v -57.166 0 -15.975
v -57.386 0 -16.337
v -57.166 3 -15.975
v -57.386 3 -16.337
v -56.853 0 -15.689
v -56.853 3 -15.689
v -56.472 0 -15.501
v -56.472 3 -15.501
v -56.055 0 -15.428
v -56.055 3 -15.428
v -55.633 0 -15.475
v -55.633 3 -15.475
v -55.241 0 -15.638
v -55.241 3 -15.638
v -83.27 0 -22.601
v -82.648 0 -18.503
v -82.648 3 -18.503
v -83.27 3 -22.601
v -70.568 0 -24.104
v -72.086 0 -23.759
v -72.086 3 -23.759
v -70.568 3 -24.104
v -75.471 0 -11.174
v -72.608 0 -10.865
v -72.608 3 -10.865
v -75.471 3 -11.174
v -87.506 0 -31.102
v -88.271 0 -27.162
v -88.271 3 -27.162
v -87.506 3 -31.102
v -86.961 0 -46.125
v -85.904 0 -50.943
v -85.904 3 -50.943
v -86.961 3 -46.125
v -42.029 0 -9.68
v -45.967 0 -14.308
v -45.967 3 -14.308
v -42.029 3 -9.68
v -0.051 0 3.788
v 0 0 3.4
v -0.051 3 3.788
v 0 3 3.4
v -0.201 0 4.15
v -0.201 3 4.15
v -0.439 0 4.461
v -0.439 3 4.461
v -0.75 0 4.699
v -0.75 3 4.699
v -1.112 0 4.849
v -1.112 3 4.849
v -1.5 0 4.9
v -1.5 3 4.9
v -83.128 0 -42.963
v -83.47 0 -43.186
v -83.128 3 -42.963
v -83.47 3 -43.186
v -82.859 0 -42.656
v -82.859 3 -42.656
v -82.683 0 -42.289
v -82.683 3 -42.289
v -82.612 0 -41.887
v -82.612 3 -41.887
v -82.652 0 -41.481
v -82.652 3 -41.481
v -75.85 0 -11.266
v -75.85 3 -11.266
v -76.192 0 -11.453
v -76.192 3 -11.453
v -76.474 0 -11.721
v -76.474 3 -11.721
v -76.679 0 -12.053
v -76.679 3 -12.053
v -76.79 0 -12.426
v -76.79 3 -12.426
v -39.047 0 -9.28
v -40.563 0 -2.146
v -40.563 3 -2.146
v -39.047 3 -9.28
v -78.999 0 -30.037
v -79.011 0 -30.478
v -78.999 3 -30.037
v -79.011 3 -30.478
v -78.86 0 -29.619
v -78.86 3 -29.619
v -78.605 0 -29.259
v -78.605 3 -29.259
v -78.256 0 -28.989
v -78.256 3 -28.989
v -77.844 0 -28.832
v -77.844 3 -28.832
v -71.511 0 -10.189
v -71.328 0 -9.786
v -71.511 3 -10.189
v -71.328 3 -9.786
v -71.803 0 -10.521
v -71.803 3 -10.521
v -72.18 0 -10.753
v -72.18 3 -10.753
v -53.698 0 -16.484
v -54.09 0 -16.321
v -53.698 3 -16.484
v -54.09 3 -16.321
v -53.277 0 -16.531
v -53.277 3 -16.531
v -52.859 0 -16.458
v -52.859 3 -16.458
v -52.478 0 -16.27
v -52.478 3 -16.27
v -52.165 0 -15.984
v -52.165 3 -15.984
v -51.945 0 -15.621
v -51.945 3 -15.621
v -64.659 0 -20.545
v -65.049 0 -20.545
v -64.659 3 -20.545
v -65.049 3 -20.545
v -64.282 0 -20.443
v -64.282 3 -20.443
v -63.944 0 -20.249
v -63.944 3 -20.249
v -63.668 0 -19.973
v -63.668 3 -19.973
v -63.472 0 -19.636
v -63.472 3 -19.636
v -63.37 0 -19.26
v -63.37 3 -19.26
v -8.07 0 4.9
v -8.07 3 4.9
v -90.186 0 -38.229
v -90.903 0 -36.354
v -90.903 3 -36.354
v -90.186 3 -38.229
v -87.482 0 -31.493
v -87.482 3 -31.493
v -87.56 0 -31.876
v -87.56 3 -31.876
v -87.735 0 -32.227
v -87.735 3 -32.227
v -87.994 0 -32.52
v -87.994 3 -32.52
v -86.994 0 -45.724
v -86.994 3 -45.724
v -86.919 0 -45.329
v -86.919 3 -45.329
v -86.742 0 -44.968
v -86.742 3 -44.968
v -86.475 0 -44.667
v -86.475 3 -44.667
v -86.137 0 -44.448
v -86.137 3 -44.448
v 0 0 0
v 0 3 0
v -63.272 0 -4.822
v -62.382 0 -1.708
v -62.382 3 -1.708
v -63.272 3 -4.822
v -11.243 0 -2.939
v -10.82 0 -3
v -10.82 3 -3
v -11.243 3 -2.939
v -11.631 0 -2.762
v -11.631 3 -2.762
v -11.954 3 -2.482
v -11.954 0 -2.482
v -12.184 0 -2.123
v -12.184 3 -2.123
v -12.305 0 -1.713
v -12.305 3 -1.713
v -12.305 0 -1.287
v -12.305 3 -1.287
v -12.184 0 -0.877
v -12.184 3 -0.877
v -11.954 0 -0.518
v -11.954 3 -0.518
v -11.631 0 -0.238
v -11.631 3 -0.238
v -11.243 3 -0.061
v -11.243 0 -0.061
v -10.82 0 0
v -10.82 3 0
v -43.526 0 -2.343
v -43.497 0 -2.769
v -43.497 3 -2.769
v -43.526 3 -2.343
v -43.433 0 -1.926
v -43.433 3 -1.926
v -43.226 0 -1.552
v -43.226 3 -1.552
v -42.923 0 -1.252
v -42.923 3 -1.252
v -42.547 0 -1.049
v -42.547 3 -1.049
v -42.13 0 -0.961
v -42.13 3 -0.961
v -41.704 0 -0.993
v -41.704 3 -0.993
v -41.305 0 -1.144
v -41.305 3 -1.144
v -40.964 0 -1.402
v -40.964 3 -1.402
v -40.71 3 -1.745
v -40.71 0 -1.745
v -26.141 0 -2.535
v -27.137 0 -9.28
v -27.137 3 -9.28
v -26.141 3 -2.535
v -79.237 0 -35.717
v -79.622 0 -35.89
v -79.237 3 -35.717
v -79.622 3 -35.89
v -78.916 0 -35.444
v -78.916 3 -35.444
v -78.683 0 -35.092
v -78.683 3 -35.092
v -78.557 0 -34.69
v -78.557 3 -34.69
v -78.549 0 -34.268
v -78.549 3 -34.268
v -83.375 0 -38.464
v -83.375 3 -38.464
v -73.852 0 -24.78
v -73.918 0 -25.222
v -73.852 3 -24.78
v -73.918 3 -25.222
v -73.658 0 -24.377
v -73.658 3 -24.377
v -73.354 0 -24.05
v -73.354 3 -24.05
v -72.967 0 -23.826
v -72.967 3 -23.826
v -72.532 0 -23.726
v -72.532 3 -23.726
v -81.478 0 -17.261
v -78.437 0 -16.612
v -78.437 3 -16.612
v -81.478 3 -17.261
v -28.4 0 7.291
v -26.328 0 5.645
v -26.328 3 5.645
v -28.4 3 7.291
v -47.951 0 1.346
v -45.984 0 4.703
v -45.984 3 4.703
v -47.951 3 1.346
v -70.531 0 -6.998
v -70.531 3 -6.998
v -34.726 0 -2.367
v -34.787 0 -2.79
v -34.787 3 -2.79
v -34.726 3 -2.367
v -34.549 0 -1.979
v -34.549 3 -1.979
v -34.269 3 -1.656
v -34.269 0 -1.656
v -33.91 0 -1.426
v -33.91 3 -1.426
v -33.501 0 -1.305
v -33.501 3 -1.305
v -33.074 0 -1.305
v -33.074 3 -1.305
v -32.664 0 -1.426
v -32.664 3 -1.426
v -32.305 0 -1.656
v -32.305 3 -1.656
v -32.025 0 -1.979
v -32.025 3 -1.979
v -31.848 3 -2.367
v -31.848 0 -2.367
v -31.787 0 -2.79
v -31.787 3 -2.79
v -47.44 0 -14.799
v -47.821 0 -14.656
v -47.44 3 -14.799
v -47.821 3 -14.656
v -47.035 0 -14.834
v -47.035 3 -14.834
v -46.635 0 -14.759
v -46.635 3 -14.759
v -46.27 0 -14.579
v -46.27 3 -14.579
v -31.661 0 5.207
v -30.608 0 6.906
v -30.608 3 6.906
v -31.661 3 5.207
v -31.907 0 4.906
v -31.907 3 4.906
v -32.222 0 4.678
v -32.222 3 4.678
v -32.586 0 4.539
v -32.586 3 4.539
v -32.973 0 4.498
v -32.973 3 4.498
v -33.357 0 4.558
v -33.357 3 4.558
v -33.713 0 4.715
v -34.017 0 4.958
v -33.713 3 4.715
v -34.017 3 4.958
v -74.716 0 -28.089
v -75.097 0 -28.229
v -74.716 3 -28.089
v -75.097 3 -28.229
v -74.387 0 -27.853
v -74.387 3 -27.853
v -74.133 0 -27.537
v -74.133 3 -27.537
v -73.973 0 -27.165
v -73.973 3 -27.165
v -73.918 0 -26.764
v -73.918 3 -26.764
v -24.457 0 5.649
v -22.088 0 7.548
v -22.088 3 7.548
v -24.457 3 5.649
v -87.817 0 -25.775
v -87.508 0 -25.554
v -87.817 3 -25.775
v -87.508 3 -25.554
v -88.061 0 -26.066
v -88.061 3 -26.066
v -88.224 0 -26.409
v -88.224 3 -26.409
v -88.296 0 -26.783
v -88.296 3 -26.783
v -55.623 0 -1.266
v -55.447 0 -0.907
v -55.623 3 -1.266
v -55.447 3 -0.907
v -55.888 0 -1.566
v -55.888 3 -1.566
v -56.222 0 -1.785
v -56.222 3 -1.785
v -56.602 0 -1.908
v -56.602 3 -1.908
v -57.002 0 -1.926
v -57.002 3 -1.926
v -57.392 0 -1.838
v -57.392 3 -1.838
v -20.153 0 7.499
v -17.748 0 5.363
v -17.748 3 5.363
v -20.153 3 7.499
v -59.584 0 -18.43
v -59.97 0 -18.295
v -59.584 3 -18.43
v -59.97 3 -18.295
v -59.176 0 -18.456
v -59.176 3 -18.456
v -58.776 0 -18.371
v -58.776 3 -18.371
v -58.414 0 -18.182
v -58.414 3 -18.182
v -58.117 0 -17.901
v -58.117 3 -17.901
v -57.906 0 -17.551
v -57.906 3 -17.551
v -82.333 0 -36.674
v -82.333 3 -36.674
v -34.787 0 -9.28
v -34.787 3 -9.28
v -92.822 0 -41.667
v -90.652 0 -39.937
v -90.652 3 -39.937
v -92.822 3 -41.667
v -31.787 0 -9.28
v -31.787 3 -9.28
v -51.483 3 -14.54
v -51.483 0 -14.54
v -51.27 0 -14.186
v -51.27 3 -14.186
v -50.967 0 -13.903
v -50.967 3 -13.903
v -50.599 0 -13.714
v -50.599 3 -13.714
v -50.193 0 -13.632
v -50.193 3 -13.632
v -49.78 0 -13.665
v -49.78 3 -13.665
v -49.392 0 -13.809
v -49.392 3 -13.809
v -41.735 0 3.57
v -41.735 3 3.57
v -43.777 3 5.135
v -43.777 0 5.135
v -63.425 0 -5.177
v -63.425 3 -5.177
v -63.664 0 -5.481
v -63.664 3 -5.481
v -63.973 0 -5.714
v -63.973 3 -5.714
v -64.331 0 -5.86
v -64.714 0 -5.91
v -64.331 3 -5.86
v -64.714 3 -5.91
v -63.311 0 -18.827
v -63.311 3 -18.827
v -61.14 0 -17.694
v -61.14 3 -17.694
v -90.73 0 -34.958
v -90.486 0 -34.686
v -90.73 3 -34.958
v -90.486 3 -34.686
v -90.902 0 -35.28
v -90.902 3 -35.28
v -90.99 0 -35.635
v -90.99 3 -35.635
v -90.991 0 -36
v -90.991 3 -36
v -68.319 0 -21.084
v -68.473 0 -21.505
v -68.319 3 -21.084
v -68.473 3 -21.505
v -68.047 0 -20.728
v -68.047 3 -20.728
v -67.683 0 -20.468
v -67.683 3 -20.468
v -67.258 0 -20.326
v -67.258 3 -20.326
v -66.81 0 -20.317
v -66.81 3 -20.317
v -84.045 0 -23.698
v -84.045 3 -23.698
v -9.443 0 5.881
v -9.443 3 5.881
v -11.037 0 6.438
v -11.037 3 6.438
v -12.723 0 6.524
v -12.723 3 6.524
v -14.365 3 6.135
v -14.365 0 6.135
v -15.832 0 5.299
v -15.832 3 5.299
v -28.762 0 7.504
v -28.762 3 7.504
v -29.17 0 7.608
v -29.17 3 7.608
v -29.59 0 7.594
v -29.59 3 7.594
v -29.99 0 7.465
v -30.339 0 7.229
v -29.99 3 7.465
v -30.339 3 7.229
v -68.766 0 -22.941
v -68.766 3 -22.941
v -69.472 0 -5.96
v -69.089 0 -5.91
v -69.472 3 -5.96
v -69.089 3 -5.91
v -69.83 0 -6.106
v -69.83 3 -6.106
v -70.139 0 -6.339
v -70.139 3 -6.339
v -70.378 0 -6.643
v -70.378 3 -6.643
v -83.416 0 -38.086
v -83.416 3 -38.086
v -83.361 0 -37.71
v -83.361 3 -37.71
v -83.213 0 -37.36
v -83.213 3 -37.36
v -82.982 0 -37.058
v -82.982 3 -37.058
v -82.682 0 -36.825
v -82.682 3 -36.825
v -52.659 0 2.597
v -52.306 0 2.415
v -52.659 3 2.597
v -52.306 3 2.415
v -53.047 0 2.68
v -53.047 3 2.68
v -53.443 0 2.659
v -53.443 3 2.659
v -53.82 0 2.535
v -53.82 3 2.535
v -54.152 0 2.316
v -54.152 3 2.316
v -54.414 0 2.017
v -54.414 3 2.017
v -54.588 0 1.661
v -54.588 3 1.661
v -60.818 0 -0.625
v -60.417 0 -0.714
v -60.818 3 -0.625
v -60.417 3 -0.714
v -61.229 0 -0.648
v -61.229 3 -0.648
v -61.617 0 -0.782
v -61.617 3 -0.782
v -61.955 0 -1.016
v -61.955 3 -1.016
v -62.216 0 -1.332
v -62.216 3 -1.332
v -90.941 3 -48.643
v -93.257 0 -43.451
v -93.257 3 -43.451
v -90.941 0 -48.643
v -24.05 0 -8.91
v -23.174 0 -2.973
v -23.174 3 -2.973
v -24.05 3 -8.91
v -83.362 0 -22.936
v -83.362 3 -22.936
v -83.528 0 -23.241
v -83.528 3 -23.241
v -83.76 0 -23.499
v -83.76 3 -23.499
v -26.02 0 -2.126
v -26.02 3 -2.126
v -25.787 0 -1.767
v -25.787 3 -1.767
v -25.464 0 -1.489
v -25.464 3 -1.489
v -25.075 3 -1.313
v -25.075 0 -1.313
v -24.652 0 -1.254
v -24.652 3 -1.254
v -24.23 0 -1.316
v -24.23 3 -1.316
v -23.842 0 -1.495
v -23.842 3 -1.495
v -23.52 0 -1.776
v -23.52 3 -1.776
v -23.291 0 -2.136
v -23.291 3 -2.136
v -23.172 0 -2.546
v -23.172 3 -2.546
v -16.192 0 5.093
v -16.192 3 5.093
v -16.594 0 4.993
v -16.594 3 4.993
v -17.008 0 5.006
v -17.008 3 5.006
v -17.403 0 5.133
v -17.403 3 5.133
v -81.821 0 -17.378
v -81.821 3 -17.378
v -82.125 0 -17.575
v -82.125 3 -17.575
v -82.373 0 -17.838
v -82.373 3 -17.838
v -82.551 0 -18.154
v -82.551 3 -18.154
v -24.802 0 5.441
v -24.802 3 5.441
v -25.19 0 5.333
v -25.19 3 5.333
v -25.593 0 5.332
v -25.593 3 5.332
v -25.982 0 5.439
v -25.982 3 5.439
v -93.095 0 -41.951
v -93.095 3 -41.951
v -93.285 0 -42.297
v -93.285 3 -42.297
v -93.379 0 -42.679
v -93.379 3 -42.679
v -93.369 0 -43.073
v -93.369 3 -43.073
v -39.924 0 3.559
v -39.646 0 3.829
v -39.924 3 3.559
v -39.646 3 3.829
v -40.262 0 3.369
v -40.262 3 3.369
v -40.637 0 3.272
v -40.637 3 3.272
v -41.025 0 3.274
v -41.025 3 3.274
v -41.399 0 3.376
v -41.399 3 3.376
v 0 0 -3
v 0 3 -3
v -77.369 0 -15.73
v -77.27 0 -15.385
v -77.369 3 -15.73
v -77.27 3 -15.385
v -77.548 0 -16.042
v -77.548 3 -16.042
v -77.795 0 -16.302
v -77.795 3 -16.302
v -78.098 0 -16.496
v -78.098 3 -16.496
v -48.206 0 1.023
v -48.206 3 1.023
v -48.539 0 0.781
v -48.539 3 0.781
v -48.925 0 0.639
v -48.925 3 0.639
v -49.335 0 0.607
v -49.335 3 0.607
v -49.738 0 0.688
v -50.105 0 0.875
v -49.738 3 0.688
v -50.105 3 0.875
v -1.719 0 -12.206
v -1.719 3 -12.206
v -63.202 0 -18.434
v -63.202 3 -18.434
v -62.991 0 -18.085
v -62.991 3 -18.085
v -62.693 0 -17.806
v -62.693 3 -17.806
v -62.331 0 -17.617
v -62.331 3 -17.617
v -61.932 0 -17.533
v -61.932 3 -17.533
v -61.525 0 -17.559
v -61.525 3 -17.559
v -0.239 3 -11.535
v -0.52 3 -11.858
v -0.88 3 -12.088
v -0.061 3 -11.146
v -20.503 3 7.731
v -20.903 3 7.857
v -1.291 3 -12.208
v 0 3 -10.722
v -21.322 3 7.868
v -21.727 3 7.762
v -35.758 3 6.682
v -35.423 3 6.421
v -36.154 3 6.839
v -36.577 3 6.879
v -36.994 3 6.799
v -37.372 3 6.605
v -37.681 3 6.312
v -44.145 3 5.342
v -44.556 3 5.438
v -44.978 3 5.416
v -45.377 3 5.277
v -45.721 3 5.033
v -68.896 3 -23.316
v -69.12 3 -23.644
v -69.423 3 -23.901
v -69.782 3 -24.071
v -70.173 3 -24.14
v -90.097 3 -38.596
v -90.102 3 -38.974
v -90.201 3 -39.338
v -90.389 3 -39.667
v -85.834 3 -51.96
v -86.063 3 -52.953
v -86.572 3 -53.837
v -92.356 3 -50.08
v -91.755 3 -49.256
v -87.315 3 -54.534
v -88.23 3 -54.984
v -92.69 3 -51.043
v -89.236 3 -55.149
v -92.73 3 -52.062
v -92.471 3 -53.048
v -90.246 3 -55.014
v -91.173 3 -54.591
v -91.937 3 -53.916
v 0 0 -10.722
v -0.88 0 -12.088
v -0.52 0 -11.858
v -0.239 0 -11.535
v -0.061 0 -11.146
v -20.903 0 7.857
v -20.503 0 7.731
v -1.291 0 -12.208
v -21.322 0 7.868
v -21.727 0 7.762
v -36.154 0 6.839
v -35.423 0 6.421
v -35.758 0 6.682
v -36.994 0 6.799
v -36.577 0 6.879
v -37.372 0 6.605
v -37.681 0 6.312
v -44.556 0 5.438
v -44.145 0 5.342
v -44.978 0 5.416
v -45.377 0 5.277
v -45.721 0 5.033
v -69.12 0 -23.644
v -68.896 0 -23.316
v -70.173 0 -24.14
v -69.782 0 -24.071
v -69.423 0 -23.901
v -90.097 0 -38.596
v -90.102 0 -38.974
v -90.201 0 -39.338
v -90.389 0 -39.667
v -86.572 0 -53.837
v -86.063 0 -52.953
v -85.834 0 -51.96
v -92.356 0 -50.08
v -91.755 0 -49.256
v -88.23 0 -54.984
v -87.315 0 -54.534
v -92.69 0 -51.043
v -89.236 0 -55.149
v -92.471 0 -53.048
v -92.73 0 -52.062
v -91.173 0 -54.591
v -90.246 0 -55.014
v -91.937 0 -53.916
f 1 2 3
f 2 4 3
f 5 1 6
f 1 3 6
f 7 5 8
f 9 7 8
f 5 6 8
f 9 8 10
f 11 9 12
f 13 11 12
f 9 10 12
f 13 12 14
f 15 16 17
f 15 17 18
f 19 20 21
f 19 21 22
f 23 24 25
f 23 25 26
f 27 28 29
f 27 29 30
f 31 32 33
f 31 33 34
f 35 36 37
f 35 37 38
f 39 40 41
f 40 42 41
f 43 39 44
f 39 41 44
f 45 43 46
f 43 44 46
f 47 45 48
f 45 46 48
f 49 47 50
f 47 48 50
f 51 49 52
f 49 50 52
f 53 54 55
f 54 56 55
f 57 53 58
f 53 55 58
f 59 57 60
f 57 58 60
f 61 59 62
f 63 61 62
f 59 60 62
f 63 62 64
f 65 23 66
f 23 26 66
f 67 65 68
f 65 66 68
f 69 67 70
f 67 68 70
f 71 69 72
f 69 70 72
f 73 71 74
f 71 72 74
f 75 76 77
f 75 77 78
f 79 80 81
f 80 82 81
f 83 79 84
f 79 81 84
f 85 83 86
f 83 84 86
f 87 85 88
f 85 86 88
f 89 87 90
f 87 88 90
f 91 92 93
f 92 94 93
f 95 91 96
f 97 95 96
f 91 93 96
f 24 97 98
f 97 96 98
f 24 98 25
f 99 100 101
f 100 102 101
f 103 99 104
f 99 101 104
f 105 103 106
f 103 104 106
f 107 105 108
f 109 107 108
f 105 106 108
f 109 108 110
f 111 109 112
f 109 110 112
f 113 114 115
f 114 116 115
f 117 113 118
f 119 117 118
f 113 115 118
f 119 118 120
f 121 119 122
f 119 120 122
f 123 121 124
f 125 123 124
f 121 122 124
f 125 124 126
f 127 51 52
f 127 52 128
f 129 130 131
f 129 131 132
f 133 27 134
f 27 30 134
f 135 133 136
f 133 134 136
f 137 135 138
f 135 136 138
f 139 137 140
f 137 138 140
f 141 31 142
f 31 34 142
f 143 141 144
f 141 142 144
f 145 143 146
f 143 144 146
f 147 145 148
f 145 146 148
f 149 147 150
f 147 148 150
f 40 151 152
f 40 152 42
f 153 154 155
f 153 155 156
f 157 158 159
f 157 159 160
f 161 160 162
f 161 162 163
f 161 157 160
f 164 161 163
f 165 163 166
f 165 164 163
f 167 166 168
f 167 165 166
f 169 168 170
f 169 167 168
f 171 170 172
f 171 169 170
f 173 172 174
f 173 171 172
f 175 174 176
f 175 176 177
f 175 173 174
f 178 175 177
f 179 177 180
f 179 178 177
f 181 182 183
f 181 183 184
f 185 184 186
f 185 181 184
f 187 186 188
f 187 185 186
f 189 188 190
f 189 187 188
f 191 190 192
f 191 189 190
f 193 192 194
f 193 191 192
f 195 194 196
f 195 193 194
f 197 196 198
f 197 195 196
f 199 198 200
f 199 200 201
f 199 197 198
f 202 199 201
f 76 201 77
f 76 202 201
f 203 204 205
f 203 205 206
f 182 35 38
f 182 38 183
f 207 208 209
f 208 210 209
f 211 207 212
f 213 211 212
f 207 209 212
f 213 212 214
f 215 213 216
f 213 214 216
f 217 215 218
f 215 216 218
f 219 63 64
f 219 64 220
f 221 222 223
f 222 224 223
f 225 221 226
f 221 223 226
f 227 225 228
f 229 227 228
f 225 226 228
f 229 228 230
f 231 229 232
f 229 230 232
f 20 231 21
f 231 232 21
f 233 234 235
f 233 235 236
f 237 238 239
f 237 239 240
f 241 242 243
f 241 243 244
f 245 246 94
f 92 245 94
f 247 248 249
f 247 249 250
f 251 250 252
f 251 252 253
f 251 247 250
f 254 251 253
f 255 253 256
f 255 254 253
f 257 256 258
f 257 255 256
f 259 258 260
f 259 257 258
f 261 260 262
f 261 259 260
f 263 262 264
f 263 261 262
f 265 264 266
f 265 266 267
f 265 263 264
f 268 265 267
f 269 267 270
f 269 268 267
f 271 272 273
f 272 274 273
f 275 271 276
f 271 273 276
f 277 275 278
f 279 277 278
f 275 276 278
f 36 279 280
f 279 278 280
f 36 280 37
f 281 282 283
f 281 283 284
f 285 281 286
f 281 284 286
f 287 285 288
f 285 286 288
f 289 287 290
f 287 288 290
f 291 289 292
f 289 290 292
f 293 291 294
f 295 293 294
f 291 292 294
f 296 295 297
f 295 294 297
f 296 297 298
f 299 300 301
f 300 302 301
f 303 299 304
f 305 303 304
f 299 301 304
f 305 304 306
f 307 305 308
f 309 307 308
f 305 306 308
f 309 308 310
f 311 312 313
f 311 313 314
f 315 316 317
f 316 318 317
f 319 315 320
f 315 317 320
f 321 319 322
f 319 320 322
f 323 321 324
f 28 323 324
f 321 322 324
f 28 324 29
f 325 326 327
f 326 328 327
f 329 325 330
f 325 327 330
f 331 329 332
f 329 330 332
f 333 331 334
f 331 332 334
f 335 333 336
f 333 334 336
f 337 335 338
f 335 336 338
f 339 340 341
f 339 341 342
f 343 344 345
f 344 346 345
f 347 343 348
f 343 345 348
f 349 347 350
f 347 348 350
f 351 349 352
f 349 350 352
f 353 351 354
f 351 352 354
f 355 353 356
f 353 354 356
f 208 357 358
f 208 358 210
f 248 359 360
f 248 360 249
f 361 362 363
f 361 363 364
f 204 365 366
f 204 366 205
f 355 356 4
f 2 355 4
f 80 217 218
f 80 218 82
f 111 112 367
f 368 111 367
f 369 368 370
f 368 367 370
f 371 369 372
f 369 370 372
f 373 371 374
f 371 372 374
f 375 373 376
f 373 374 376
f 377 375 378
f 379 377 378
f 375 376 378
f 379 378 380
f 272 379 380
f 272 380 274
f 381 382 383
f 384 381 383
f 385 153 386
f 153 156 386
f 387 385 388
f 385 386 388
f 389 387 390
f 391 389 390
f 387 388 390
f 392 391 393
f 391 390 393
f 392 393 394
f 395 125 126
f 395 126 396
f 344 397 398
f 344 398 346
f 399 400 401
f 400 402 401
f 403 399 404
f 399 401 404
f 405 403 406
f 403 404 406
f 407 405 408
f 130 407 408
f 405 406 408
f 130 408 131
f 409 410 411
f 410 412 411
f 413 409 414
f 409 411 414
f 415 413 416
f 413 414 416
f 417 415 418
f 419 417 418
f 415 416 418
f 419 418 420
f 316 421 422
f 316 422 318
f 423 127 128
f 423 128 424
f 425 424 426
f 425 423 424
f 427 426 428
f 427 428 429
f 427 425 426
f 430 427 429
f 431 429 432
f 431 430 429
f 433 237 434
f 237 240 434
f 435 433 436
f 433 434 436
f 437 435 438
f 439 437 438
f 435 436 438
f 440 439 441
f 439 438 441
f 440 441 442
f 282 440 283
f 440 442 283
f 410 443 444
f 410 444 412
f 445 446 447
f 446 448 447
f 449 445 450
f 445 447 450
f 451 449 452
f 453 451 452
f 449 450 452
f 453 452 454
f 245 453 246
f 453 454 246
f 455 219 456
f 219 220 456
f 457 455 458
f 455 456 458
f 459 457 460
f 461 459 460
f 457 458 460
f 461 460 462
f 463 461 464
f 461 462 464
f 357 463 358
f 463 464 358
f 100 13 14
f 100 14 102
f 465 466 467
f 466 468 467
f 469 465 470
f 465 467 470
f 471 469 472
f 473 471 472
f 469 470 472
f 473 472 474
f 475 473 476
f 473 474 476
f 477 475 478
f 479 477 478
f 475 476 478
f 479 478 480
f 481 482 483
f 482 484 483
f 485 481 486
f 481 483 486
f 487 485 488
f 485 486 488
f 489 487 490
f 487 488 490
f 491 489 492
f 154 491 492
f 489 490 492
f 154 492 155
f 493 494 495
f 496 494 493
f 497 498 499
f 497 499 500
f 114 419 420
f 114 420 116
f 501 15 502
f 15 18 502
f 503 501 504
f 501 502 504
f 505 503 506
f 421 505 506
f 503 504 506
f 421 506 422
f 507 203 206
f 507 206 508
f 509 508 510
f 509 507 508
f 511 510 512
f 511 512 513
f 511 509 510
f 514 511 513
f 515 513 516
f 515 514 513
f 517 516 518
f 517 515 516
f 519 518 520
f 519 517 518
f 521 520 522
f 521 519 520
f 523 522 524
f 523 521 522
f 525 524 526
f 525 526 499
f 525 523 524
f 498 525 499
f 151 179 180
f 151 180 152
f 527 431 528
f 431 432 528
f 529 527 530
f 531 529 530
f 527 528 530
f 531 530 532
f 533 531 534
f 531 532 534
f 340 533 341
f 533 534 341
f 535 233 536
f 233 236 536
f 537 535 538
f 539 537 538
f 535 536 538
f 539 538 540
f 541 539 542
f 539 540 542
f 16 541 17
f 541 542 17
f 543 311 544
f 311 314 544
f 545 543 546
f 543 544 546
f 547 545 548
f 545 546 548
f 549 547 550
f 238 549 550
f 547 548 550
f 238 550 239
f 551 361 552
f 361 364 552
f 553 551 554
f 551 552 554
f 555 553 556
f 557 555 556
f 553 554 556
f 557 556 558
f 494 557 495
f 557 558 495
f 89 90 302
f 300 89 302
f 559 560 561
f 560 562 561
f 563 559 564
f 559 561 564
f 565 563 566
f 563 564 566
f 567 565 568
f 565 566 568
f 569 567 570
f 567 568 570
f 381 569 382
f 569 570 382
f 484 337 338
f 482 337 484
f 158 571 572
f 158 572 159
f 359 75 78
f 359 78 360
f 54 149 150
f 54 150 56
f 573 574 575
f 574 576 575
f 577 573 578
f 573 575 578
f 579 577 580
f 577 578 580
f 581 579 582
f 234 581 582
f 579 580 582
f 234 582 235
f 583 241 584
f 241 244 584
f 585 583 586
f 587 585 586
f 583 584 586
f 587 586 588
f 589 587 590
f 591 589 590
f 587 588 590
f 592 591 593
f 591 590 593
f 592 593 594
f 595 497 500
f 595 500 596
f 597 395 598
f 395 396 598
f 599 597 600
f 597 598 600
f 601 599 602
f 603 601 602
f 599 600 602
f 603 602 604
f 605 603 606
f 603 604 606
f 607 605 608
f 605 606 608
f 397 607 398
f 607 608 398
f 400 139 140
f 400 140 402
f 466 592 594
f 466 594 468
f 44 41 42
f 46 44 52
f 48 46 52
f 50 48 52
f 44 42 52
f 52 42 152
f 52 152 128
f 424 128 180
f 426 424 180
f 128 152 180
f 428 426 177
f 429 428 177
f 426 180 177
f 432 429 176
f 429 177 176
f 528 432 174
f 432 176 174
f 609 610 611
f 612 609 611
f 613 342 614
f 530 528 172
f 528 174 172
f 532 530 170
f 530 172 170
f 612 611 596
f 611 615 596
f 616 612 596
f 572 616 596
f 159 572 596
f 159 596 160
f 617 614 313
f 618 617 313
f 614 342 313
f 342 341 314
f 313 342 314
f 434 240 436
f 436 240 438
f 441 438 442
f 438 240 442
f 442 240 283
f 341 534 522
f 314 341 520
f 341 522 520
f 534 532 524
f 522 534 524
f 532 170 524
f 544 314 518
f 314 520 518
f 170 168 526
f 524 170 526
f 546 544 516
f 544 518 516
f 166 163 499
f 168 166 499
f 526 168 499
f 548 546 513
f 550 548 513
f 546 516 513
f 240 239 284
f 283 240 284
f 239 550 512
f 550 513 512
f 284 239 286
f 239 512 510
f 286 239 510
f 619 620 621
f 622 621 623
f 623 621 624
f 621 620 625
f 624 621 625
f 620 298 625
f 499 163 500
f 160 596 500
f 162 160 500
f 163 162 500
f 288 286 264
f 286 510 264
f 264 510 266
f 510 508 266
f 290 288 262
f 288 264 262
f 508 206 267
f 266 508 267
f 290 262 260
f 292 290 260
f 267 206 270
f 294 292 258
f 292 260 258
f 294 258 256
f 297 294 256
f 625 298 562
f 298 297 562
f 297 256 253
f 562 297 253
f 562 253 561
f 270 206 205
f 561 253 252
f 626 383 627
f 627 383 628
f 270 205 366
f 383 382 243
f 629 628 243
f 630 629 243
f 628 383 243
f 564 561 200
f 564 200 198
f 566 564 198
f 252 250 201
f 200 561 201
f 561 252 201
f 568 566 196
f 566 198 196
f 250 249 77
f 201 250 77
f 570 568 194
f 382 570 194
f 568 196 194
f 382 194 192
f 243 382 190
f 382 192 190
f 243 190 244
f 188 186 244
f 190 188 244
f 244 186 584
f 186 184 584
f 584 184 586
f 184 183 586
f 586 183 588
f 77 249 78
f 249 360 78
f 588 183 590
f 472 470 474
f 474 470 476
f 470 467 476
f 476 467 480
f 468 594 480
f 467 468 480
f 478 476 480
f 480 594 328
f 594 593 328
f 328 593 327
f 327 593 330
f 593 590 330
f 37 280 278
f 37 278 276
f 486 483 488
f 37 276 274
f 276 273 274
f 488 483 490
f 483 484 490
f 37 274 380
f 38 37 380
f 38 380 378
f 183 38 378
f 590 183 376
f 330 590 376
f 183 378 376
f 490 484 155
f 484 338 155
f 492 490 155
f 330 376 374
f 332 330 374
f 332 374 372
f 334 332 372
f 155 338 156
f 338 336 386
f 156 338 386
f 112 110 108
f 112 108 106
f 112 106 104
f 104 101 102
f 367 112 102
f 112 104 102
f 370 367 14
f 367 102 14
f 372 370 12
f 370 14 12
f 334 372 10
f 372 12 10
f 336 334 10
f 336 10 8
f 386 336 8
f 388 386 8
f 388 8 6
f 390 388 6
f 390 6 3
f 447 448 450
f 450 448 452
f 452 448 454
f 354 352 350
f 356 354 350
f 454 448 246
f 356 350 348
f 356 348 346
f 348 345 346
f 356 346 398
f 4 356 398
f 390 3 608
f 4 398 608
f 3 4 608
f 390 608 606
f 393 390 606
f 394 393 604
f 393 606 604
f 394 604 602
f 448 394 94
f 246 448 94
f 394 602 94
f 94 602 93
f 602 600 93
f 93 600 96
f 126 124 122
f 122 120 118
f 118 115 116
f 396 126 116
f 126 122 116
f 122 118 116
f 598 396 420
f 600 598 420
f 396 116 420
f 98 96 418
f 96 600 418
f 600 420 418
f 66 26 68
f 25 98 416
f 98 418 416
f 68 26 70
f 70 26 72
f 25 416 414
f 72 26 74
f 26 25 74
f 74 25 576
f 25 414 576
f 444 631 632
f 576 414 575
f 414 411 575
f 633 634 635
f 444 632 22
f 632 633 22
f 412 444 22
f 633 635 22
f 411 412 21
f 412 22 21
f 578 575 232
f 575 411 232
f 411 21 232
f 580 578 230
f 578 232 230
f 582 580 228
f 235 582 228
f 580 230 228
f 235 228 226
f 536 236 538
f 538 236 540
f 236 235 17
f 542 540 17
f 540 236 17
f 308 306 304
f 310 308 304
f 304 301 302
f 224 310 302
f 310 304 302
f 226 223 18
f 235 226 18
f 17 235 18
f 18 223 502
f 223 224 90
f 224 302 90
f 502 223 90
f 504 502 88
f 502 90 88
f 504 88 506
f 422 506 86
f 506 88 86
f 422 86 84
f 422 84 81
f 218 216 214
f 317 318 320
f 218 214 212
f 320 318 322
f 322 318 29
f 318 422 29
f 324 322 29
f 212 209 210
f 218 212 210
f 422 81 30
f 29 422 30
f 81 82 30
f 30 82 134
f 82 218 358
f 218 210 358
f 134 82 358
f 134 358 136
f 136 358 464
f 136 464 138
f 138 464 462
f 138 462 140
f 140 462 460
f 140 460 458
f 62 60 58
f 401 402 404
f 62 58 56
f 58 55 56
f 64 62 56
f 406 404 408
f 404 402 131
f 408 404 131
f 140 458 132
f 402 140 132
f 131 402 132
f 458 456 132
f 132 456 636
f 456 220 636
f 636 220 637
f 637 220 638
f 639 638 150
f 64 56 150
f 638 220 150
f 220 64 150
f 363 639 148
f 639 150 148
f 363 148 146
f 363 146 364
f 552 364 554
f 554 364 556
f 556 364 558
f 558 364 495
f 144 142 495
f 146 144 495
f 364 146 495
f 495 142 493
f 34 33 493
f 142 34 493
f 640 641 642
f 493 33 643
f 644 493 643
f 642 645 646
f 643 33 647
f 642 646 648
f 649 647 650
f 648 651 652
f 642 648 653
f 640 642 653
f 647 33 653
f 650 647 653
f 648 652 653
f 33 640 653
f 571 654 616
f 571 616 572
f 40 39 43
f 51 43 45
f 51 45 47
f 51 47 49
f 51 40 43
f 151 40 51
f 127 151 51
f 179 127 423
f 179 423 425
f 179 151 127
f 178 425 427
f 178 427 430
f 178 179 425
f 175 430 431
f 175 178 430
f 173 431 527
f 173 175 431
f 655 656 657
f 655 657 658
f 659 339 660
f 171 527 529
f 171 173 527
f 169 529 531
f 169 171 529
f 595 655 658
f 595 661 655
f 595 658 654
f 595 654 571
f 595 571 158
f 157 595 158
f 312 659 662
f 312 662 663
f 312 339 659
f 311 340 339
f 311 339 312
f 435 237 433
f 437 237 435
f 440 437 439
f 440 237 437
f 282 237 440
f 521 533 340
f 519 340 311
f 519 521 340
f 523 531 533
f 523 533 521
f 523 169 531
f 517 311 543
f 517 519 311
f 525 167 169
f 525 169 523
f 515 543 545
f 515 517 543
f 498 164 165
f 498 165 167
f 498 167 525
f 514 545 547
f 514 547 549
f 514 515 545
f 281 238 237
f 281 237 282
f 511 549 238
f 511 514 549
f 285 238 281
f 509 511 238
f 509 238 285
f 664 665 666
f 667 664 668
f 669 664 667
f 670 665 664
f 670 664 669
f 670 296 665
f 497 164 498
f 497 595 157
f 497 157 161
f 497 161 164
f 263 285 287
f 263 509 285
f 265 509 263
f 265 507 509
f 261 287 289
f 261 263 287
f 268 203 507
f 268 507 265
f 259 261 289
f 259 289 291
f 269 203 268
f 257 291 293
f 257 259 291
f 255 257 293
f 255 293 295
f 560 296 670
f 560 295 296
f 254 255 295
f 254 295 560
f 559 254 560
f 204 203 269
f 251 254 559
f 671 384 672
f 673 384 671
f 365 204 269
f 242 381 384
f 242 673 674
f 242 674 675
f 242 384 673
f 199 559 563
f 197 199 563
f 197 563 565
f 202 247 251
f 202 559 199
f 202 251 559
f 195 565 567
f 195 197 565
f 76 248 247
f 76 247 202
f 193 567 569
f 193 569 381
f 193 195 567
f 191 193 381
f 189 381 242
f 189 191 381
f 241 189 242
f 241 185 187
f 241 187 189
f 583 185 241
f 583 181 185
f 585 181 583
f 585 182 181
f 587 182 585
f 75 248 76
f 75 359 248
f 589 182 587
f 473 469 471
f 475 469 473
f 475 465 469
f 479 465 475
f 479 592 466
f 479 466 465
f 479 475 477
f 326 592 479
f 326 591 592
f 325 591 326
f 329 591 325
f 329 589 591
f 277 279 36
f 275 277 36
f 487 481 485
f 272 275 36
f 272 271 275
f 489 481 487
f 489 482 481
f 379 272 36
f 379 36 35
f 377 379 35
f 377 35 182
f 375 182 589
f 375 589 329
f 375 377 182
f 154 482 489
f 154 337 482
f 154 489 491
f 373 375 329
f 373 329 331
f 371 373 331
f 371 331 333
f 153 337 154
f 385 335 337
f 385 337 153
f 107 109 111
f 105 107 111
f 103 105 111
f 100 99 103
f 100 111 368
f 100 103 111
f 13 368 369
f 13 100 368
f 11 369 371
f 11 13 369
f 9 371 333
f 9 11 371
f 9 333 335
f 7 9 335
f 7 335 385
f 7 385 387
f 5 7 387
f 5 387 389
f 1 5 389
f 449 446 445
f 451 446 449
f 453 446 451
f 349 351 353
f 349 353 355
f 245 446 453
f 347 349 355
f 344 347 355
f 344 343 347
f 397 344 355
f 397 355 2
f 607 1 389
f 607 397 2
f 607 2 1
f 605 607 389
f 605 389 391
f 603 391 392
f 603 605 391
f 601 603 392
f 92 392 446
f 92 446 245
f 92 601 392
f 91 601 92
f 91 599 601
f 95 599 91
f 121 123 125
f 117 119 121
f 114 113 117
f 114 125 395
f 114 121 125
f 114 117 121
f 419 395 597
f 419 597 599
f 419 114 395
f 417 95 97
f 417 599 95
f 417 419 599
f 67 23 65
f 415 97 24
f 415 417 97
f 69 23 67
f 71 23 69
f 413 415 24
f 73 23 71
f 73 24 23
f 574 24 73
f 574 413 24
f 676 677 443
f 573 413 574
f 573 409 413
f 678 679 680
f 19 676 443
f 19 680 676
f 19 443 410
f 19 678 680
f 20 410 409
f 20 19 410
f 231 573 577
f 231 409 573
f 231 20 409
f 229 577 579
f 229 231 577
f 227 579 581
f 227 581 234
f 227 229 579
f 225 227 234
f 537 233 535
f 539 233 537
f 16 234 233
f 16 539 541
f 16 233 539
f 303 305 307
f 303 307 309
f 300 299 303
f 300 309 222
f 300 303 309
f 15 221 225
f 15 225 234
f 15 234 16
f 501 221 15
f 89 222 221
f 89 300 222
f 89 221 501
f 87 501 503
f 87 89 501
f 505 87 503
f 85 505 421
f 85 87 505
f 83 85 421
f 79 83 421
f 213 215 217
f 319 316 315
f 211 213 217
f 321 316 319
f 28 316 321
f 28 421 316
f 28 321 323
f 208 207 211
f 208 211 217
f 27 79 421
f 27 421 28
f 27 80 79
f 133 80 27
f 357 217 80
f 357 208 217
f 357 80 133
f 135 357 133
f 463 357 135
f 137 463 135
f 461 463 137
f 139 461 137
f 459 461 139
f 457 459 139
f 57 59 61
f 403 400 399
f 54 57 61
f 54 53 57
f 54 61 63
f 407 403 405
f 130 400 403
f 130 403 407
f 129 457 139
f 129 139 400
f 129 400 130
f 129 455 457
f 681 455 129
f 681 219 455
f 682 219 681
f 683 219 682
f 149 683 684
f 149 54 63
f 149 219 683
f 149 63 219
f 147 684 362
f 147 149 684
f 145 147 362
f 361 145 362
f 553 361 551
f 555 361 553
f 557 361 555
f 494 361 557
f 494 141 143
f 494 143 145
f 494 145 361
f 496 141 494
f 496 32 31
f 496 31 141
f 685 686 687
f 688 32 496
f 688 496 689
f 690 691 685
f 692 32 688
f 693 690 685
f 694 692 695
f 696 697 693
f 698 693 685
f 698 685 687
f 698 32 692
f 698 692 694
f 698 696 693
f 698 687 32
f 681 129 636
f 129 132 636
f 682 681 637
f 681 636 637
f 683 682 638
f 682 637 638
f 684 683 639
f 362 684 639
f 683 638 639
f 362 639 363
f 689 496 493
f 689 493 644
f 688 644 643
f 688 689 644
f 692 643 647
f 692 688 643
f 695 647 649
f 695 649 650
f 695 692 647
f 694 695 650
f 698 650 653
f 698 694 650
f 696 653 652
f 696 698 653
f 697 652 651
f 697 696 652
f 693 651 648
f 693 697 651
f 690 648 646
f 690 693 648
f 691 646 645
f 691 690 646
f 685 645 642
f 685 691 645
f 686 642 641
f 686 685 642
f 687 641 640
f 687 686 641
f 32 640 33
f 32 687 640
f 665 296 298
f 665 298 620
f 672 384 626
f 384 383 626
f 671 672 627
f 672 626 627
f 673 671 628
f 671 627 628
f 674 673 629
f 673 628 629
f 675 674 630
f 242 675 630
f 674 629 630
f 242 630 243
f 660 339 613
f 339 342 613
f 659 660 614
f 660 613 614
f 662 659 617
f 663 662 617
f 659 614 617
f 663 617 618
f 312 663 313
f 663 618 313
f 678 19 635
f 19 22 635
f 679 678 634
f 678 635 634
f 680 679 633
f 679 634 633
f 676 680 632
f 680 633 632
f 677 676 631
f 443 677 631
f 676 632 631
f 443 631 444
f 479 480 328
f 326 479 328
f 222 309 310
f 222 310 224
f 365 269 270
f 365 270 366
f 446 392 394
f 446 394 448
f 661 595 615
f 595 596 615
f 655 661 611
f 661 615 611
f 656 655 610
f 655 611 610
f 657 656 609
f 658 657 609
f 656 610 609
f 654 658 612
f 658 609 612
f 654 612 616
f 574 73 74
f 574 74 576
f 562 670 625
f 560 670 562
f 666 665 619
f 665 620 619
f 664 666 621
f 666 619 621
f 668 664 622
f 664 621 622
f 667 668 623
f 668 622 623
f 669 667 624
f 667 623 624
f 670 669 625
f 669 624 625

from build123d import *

# Parameters (mm, degrees)
BOSS_EXTRUDE1_DEPTH = 3
FILLET1_R           = 1.5


with BuildPart() as part:
    # Sketch1 → Boss-Extrude1 (new body)
    with BuildSketch(Plane(origin=(0, 0, 0), x_dir=(1, 0, 0), z_dir=(0, 1, 0))):
        with BuildLine():
            Line((0, 0), (0, -4.9))
            Line((0, -4.9), (-8.07, -4.9))
            ThreePointArc((-8.07, -4.9), (-12.492074003, -6.540978064), (-16.72, -4.45))
            Line((-16.72, -4.45), (-21.1, -8.34))
            Line((-21.1, -8.34), (-25.391000021, -4.9))
            Line((-25.391000021, -4.9), (-29.72, -8.34))
            Line((-29.72, -8.34), (-32.678148271, -3.564930925))
            Line((-32.678148271, -3.564930925), (-36.614261147, -7.659439528))
            Line((-36.614261147, -7.659439528), (-40.562742989, -2.671583593))
            Line((-40.562742989, -2.671583593), (-45.125314278, -6.1674487))
            Line((-45.125314278, -6.1674487), (-48.772662965, 0.055817603))
            Line((-48.772662965, 0.055817603), (-53.951591598, -3.564930925))
            Line((-53.951591598, -3.564930925), (-55.938419332, 2.377817283))
            Line((-55.938419332, 2.377817283), (-61.936703958, 0.149885503))
            Line((-61.936703958, 0.149885503), (-63.582832138, 5.91))
            Line((-63.582832138, 5.91), (-70.22, 5.91))
            Line((-70.22, 5.91), (-71.604933744, 10.75614566))
            Line((-71.604933744, 10.75614566), (-76.607483243, 11.297362631))
            Line((-76.607483243, 11.297362631), (-77.433672711, 16.398034852))
            Line((-77.433672711, 16.398034852), (-82.492501507, 17.477107174))
            Line((-82.492501507, 17.477107174), (-83.382855617, 23.343000893))
            Line((-83.382855617, 23.343000893), (-88.482100064, 26.076459388))
            Line((-88.482100064, 26.076459388), (-87.341224149, 31.951970353))
            Line((-87.341224149, 31.951970353), (-91.277246058, 35.3745981))
            Line((-91.277246058, 35.3745981), (-89.794107367, 39.253576213))
            Line((-89.794107367, 39.253576213), (-93.730129276, 42.390984981))
            Line((-93.730129276, 42.390984981), (-90.94122884, 48.642955937))
            ThreePointArc((-90.94122884, 48.642955937), (-90.725239113, 54.836582666), (-85.903522924, 50.94316301))
            Line((-85.903522924, 50.94316301), (-87.217276284, 44.958621486))
            Line((-87.217276284, 44.958621486), (-82.368553642, 42.665402728))
            Line((-82.368553642, 42.665402728), (-83.70912889, 37.071165861))
            Line((-83.70912889, 37.071165861), (-78.394556731, 35.535845015))
            Line((-78.394556731, 35.535845015), (-79.175897543, 29.124170033))
            Line((-79.175897543, 29.124170033), (-73.918336593, 27.970006705))
            Line((-73.918336593, 27.970006705), (-73.918336593, 23.343000893))
            Line((-73.918336593, 23.343000893), (-69.072893301, 24.443370455))
            Line((-69.072893301, 24.443370455), (-68.193719482, 20.137924483))
            Line((-68.193719482, 20.137924483), (-63.570641565, 20.736646715))
            Line((-63.570641565, 20.736646715), (-63.025832704, 16.726559775))
            Line((-63.025832704, 16.726559775), (-58.539054065, 19.028863157))
            Line((-58.539054065, 19.028863157), (-56.712577987, 14.764331957))
            Line((-56.712577987, 14.764331957), (-52.617493847, 17.195788166))
            Line((-52.617493847, 17.195788166), (-50.838197485, 13.029757816))
            Line((-50.838197485, 13.029757816), (-46.752937471, 15.232009778))
            Line((-46.752937471, 15.232009778), (-42.029094435, 9.68))
            Line((-42.029094435, 9.68), (-43.497257011, 2.76895697))
            ThreePointArc((-43.497257011, 2.76895697), (-42.341699959, 0.99), (-40.562742989, 2.145557051))
            Line((-40.562742989, 2.145557051), (-39.047121962, 9.28))
            Line((-39.047121962, 9.28), (-34.787121962, 9.28))
            Line((-34.787121962, 9.28), (-34.787121962, 2.79))
            ThreePointArc((-34.787121962, 2.79), (-33.287121962, 1.29), (-31.787121962, 2.79))
            Line((-31.787121962, 2.79), (-31.787121962, 9.28))
            Line((-31.787121962, 9.28), (-27.137121962, 9.28))
            Line((-27.137121962, 9.28), (-26.141480642, 2.534880632))
            ThreePointArc((-26.141480642, 2.534880632), (-24.438519401, 1.27), (-23.173638769, 2.972961241))
            Line((-23.173638769, 2.972961241), (-24.05, 8.91))
            Line((-24.05, 8.91), (0, 12.46))
            Line((0, 12.46), (0, 3))
            Line((0, 3), (-10.82, 3))
            ThreePointArc((-10.82, 3), (-12.32, 1.5), (-10.82, 0))
            Line((-10.82, 0), (0, 0))
        make_face()
    extrude(amount=BOSS_EXTRUDE1_DEPTH)

    # Fillet1
    fillet1_edges = [part.edges().sort_by_distance(p)[0] for p in [
        (-40.562742989, 1.5, 2.671583593),
        (-45.125314278, 1.5, 6.1674487),
        (-48.772662965, 1.5, -0.055817603),
        (-53.951591598, 1.5, 3.564930925),
        (-55.938419332, 1.5, -2.377817283),
        (-61.936703958, 1.5, -0.149885503),
        (-63.582832138, 1.5, -5.91),
        (-70.22, 1.5, -5.91),
        (-71.604933744, 1.5, -10.75614566),
        (-76.607483243, 1.5, -11.297362631),
        (-77.433672711, 1.5, -16.398034852),
        (-82.492501507, 1.5, -17.477107174),
        (-83.382855617, 1.5, -23.343000893),
        (-88.482100064, 1.5, -26.076459388),
        (-87.341224149, 1.5, -31.951970353),
        (-91.277246058, 1.5, -35.3745981),
        (-89.794107367, 1.5, -39.253576213),
        (-93.730129276, 1.5, -42.390984981),
        (-87.217276284, 1.5, -44.958621486),
        (-82.368553642, 1.5, -42.665402728),
        (-83.70912889, 1.5, -37.071165861),
        (-78.394556731, 1.5, -35.535845015),
        (-79.175897543, 1.5, -29.124170033),
        (-73.918336593, 1.5, -27.970006705),
        (-73.918336593, 1.5, -23.343000893),
        (-69.072893301, 1.5, -24.443370455),
        (-68.193719482, 1.5, -20.137924483),
        (-63.570641565, 1.5, -20.736646715),
        (-63.025832704, 1.5, -16.726559775),
        (-58.539054065, 1.5, -19.028863157),
        (-56.712577987, 1.5, -14.764331957),
        (-52.617493847, 1.5, -17.195788166),
        (-50.838197485, 1.5, -13.029757816),
        (-46.752937471, 1.5, -15.232009778),
        (0, 1.5, -12.46),
        (0, 1.5, 4.9),
        (-16.72, 1.5, 4.45),
        (-21.1, 1.5, 8.34),
        (-25.391000021, 1.5, 4.9),
        (-29.72, 1.5, 8.34),
        (-32.678148271, 1.5, 3.564930925),
        (-36.614261147, 1.5, 7.659439528),
    ]]
    fillet(fillet1_edges, radius=FILLET1_R)


solid = part.part
